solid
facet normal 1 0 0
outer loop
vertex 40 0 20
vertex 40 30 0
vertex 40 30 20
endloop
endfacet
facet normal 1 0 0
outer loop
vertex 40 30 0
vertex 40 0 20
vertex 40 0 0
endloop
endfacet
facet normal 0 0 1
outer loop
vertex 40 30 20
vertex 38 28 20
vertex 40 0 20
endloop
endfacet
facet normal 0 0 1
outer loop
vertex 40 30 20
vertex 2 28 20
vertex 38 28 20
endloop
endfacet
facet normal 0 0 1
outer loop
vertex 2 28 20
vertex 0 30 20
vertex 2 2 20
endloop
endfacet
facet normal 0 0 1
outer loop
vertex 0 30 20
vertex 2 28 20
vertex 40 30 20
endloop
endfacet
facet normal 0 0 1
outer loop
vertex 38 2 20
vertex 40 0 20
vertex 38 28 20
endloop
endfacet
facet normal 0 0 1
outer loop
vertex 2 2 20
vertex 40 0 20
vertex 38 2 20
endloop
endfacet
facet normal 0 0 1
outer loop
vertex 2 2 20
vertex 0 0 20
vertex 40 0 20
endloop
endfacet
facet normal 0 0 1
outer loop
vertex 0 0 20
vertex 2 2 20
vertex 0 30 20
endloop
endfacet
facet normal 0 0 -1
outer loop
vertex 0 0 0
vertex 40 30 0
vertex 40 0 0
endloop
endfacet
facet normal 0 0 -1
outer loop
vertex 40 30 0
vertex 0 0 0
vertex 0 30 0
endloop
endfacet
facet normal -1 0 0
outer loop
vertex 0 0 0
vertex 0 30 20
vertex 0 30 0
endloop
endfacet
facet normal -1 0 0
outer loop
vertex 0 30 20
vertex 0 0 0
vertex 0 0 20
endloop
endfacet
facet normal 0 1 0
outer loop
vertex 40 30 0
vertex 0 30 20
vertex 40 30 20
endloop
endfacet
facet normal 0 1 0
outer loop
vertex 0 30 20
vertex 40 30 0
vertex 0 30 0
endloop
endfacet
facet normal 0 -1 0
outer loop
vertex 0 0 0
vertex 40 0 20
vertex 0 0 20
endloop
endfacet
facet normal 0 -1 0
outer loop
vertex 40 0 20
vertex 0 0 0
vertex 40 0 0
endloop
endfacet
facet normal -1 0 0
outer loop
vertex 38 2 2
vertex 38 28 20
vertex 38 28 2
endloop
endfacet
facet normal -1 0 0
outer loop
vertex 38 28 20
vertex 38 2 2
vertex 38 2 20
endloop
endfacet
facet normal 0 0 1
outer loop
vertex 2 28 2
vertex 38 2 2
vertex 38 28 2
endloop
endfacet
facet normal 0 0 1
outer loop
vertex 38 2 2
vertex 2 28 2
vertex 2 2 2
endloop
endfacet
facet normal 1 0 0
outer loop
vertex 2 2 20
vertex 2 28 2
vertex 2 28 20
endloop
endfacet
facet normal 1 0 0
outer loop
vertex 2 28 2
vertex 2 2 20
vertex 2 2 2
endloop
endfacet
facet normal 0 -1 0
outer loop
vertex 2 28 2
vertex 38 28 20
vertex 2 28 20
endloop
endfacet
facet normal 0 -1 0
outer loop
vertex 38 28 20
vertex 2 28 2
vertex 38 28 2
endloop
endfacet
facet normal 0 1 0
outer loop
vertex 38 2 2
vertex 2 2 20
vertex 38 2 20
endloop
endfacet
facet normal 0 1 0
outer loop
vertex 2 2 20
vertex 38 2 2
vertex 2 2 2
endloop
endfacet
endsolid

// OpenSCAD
// units=mm — generated by scad_emitter.py
// part=unnamed
$fn = 48;

difference() { cube([40, 30, 20]); translate([2, 2, 2]) cube([36, 26, 20]); }
